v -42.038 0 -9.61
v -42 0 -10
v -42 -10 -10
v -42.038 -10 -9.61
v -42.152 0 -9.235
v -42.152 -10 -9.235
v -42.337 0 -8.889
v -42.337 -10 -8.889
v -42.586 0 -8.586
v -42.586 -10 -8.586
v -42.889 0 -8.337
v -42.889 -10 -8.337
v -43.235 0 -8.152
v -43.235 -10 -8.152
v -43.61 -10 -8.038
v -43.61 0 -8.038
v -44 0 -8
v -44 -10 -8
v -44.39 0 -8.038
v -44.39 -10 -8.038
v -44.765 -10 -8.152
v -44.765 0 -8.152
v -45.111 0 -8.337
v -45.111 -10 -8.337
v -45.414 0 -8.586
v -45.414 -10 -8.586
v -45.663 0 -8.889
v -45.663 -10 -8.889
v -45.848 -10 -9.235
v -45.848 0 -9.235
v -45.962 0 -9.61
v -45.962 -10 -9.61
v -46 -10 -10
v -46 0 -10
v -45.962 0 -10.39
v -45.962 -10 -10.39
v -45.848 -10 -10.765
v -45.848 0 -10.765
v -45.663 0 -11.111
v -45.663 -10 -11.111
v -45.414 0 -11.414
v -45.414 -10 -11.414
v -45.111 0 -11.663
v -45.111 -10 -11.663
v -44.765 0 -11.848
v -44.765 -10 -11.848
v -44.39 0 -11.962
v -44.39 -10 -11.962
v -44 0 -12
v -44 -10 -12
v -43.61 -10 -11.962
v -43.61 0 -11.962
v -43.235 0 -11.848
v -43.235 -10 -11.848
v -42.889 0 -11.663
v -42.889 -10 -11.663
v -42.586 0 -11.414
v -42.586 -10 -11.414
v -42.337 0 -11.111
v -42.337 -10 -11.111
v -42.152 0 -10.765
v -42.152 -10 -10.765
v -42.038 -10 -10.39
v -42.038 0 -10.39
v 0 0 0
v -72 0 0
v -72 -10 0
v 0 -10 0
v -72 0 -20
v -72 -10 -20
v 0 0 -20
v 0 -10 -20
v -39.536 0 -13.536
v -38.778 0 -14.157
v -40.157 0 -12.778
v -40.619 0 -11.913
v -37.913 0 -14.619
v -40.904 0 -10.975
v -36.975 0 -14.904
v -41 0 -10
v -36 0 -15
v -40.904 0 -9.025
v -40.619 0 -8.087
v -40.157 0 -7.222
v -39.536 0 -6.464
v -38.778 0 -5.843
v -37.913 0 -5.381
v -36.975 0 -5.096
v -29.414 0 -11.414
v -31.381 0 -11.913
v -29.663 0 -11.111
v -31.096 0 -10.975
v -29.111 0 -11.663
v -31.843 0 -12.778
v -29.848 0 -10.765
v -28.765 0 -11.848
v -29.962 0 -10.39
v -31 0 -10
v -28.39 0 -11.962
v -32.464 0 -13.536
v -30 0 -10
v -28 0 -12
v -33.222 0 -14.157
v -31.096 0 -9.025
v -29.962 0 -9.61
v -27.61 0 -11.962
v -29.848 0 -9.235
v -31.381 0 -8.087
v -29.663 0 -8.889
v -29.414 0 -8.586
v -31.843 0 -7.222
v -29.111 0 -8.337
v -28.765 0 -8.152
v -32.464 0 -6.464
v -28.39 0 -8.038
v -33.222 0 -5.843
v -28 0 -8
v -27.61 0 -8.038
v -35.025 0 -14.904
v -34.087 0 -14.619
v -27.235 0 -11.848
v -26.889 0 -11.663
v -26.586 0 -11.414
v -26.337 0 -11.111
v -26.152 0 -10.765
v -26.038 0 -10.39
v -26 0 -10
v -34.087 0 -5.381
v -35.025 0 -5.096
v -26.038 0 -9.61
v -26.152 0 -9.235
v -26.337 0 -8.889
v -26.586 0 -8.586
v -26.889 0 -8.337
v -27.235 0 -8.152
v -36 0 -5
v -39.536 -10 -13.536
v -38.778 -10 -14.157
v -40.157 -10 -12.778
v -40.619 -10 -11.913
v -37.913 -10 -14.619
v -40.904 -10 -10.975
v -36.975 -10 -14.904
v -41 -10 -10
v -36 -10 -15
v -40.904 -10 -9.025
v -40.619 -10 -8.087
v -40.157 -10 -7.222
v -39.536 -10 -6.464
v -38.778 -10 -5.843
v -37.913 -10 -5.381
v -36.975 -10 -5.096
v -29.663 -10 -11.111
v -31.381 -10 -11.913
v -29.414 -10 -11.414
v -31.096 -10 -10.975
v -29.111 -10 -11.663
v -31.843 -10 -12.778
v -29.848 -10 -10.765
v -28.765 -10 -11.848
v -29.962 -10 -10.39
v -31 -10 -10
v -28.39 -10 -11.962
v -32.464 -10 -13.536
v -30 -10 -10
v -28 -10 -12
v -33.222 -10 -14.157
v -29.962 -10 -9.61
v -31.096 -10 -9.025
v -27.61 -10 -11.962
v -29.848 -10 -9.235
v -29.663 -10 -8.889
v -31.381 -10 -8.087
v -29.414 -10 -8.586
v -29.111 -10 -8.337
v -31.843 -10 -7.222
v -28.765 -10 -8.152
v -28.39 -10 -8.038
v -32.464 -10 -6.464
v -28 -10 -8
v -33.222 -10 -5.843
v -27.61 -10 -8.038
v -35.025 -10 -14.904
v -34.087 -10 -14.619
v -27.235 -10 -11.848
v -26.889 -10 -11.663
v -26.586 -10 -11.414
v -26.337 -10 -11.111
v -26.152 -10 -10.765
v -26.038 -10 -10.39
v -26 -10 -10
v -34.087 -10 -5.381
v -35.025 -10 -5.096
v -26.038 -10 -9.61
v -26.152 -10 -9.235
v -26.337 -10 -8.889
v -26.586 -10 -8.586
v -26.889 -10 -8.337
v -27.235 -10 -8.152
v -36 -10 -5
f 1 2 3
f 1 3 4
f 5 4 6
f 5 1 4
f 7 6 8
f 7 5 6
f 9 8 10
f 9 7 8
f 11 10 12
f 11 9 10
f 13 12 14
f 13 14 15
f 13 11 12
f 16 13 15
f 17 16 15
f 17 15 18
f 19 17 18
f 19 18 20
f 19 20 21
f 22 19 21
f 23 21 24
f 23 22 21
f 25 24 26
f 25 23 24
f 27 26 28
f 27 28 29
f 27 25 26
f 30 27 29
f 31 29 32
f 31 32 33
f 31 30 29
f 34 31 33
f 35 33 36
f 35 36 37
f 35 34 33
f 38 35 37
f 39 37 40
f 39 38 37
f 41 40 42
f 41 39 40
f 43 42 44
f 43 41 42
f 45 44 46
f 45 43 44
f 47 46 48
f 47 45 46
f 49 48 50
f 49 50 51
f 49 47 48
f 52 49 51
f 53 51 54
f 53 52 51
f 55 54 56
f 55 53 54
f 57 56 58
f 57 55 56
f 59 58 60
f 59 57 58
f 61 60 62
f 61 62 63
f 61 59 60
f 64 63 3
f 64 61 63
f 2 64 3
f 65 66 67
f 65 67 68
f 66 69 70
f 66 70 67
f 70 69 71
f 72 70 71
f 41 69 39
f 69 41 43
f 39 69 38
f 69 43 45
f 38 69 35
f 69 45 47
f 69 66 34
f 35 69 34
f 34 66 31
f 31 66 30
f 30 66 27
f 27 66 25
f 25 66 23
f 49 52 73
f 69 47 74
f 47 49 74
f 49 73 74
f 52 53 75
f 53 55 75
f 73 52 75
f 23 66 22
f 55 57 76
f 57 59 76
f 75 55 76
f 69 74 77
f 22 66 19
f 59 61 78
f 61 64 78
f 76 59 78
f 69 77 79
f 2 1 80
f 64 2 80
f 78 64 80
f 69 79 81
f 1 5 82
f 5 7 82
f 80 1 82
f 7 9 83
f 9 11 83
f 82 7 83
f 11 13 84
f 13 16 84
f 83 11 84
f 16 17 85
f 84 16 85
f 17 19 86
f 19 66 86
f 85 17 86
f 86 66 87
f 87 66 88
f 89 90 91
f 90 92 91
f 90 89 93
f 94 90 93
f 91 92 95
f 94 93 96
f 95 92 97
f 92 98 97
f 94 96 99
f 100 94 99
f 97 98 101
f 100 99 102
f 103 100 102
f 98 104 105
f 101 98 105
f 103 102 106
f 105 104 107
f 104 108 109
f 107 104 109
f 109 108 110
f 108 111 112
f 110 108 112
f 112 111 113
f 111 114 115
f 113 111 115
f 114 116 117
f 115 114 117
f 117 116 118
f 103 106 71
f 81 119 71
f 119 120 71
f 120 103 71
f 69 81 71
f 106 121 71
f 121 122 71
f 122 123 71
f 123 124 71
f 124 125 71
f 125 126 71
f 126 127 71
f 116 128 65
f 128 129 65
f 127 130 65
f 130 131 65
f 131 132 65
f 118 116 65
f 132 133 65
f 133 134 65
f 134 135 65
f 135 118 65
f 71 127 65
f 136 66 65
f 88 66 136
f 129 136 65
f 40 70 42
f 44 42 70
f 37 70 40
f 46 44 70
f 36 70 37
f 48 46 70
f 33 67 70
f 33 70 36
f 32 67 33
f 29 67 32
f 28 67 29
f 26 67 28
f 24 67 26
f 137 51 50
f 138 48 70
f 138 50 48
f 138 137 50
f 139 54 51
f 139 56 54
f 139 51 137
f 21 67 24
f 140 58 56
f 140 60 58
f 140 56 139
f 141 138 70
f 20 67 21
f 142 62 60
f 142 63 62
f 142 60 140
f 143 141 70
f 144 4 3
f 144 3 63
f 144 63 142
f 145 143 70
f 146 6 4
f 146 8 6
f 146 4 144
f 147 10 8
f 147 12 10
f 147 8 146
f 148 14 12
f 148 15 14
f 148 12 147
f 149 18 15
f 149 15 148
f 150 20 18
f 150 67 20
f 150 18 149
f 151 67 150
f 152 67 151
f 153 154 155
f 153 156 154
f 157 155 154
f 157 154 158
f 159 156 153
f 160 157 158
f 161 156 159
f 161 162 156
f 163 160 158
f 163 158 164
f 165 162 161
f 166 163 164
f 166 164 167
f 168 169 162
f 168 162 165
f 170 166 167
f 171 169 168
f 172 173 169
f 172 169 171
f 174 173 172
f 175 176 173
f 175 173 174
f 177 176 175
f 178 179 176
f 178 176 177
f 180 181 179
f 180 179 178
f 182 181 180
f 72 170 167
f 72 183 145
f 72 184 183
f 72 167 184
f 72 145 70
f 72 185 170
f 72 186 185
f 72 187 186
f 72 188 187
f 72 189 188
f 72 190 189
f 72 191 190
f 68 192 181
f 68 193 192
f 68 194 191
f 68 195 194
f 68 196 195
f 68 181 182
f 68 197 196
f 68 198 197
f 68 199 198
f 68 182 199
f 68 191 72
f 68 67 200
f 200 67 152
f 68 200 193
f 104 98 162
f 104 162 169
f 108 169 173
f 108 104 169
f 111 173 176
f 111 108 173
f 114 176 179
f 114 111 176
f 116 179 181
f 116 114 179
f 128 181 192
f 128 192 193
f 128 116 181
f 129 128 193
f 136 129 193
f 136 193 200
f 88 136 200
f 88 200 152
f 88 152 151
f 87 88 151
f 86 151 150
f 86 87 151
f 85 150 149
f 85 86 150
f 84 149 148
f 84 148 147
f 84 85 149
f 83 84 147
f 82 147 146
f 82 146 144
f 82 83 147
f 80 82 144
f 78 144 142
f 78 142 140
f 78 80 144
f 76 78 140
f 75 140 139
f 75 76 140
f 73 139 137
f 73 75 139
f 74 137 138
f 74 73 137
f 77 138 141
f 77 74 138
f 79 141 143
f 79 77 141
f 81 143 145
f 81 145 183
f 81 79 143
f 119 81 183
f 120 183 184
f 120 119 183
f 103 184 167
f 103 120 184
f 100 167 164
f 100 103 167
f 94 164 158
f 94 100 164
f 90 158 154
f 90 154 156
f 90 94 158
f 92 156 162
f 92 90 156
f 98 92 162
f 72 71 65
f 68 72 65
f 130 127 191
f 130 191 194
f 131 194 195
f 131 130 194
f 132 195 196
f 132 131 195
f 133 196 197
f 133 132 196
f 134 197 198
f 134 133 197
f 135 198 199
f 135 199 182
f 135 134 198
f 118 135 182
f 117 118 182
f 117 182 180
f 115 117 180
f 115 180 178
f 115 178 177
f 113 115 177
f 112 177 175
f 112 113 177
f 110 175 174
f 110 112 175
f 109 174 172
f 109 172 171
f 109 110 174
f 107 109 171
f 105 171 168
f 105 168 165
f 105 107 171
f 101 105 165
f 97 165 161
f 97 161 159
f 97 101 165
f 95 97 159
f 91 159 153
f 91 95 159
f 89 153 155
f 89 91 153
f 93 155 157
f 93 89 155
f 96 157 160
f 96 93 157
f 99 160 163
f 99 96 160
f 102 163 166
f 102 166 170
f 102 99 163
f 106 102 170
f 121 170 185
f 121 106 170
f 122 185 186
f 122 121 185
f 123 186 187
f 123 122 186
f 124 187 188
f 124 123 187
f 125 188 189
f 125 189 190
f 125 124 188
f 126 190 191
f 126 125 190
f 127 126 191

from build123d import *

# Parameters (mm, degrees)
F0_W     = 72
F0_H     = 20
F0_R     = 2
F0_R_2   = 5
F1_DEPTH = 10


with BuildPart() as f1:
    # F0 (on Front) → F1 (new body)
    with BuildSketch(Plane.XZ):
        with Locations((-36, -10)):
            Rectangle(F0_W, F0_H)
        with Locations((-44, -10)):
            Circle(F0_R, mode=Mode.SUBTRACT)
        with Locations((-36, -10)):
            Circle(F0_R_2, mode=Mode.SUBTRACT)
        with Locations((-28, -10)):
            Circle(F0_R, mode=Mode.SUBTRACT)
    extrude(amount=F1_DEPTH)


solid = f1.part
